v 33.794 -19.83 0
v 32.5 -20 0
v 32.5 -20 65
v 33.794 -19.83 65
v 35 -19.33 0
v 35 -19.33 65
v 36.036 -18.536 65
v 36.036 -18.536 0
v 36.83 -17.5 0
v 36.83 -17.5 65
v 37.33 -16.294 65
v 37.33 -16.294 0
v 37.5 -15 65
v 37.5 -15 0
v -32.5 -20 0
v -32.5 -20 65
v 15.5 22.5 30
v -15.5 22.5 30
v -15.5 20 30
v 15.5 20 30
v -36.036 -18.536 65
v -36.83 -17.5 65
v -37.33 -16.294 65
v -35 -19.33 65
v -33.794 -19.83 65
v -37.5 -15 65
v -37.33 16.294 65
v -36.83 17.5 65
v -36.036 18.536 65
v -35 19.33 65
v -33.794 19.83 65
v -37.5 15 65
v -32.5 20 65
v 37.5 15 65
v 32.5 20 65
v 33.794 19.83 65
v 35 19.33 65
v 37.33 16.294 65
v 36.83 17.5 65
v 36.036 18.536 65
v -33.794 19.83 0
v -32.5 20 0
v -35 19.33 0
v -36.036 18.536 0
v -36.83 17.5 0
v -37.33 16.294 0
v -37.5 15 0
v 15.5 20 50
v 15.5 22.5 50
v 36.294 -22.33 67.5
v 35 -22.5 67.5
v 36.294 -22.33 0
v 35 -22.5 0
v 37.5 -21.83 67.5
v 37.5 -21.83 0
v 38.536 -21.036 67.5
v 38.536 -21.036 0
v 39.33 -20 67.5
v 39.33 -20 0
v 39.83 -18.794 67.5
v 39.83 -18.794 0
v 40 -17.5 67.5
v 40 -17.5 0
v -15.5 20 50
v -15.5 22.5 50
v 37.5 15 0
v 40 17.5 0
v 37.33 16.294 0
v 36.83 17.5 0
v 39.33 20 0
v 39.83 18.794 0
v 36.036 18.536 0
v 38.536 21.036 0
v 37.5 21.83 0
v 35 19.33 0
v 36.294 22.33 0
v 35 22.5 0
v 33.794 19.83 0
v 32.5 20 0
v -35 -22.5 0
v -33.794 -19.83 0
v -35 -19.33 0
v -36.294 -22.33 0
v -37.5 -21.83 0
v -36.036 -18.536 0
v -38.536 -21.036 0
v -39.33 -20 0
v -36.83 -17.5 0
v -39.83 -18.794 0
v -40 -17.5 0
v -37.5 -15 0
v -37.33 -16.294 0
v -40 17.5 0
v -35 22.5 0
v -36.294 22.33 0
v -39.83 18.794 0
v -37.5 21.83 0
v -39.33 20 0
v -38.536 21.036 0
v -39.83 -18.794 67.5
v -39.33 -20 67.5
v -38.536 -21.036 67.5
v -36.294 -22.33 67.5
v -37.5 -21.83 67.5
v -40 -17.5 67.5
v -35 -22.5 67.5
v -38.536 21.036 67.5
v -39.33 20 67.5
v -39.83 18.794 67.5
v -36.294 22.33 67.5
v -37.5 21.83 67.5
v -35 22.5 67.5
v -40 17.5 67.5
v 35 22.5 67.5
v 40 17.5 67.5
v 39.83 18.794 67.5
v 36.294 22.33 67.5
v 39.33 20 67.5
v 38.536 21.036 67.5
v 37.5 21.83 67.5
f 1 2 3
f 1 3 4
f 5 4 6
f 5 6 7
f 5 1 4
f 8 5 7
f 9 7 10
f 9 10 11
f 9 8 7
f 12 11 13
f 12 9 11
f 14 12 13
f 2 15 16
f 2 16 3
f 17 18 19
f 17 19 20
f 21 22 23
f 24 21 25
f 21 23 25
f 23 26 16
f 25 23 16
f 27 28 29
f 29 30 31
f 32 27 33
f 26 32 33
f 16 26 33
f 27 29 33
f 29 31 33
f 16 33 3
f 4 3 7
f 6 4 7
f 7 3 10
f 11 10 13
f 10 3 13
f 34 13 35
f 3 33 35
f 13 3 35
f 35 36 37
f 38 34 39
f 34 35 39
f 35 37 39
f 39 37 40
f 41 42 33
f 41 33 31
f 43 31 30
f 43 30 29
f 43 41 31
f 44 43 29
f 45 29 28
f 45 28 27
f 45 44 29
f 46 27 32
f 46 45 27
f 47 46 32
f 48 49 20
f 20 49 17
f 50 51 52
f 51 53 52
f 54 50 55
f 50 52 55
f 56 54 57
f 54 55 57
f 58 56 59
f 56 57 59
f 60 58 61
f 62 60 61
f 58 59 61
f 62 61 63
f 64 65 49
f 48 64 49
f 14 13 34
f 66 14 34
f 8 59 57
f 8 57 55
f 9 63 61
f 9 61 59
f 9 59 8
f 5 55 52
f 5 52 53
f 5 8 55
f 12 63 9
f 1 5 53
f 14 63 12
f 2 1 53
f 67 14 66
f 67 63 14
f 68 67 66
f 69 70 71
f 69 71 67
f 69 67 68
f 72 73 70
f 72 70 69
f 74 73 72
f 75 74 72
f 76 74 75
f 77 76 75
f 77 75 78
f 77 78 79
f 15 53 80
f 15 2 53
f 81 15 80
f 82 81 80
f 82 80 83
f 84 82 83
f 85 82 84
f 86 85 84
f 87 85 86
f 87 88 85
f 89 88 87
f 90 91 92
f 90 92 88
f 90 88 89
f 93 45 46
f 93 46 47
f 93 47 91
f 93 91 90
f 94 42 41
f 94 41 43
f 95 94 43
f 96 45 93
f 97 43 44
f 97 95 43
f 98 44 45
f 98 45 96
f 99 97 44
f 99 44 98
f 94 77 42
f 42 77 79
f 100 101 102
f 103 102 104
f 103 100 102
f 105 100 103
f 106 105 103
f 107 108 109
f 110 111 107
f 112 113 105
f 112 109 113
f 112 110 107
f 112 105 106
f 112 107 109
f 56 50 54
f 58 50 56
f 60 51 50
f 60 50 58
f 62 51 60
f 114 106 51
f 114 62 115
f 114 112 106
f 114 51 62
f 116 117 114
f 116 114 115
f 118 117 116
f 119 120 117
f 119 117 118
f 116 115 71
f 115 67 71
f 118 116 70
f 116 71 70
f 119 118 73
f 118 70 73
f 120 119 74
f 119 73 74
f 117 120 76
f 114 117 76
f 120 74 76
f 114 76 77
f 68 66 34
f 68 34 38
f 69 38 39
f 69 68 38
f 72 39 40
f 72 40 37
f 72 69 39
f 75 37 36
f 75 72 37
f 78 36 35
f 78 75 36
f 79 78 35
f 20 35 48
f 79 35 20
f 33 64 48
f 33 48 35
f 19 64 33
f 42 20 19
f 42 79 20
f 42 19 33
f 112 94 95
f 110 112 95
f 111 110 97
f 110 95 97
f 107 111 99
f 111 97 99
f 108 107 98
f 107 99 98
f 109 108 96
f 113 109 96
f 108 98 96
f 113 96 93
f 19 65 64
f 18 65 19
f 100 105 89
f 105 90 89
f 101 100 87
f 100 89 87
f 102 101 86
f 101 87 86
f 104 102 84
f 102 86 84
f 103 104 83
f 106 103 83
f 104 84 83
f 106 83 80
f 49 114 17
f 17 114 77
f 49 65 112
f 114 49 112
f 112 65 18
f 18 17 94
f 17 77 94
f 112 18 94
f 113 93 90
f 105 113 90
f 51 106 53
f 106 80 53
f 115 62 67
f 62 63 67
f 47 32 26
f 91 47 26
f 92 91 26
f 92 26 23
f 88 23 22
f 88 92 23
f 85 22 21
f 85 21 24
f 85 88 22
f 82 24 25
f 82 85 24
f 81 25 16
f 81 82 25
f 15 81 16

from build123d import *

# Parameters (mm, degrees)
BOSS_EXTRUDE1_DEPTH = 65
BOSS_EXTRUDE2_DEPTH = 2.5
CUT_EXTRUDE1_REACH  = 47
SKETCH4_W           = 31
SKETCH4_H           = 20


with BuildPart() as part:
    # Sketch2 → Boss-Extrude1 (new body)
    with BuildSketch(Plane.XY):
        with BuildLine():
            ThreePointArc((-40, 17.5), (-38.535533906, 21.035533906), (-35, 22.5))
            Line((-35, 22.5), (35, 22.5))
            ThreePointArc((35, 22.5), (38.535533906, 21.035533906), (40, 17.5))
            Line((40, 17.5), (40, -17.5))
            ThreePointArc((40, -17.5), (38.535533906, -21.035533906), (35, -22.5))
            Line((35, -22.5), (-35, -22.5))
            ThreePointArc((-35, -22.5), (-38.535533906, -21.035533906), (-40, -17.5))
            Line((-40, -17.5), (-40, 17.5))
        make_face()
        with BuildLine():
            ThreePointArc((-32.5, 20), (-36.035533906, 18.535533906), (-37.5, 15))
            Line((-37.5, 15), (-37.5, -15))
            ThreePointArc((-37.5, -15), (-36.035533906, -18.535533906), (-32.5, -20))
            Line((-32.5, -20), (32.5, -20))
            ThreePointArc((32.5, -20), (36.035533906, -18.535533906), (37.5, -15))
            Line((37.5, -15), (37.5, 15))
            ThreePointArc((37.5, 15), (36.035533906, 18.535533906), (32.5, 20))
            Line((32.5, 20), (-32.5, 20))
        make_face(mode=Mode.SUBTRACT)
    extrude(amount=BOSS_EXTRUDE1_DEPTH)

    # Sketch3 → Boss-Extrude2 (add)
    with BuildSketch(Plane.XY.offset(65)):
        with BuildLine():
            Line((-40, 17.5), (-40, -17.5))
            ThreePointArc((-40, -17.5), (-38.535533906, -21.035533906), (-35, -22.5))
            Line((-35, -22.5), (35, -22.5))
            ThreePointArc((35, -22.5), (38.535533906, -21.035533906), (40, -17.5))
            Line((40, -17.5), (40, 17.5))
            ThreePointArc((40, 17.5), (38.535533906, 21.035533906), (35, 22.5))
            Line((35, 22.5), (-35, 22.5))
            ThreePointArc((-35, 22.5), (-38.535533906, 21.035533906), (-40, 17.5))
        make_face()
    extrude(amount=BOSS_EXTRUDE2_DEPTH)

    # Sketch4 → Cut-Extrude1 (cut, up to next)
    with BuildSketch(Plane(origin=(0, 22.5, 0), x_dir=(1, 0, 0), z_dir=(0, 1, 0)), mode=Mode.PRIVATE) as cut_extrude1_sk1:
        with Locations((0, -40)):
            Rectangle(SKETCH4_W, SKETCH4_H)
    cut_extrude1_tool1 = extrude(cut_extrude1_sk1.sketch, amount=-CUT_EXTRUDE1_REACH, mode=Mode.PRIVATE) & part.part
    add(cut_extrude1_tool1.solids().sort_by_distance((0, 22.5, 40))[0], mode=Mode.SUBTRACT)


solid = part.part
